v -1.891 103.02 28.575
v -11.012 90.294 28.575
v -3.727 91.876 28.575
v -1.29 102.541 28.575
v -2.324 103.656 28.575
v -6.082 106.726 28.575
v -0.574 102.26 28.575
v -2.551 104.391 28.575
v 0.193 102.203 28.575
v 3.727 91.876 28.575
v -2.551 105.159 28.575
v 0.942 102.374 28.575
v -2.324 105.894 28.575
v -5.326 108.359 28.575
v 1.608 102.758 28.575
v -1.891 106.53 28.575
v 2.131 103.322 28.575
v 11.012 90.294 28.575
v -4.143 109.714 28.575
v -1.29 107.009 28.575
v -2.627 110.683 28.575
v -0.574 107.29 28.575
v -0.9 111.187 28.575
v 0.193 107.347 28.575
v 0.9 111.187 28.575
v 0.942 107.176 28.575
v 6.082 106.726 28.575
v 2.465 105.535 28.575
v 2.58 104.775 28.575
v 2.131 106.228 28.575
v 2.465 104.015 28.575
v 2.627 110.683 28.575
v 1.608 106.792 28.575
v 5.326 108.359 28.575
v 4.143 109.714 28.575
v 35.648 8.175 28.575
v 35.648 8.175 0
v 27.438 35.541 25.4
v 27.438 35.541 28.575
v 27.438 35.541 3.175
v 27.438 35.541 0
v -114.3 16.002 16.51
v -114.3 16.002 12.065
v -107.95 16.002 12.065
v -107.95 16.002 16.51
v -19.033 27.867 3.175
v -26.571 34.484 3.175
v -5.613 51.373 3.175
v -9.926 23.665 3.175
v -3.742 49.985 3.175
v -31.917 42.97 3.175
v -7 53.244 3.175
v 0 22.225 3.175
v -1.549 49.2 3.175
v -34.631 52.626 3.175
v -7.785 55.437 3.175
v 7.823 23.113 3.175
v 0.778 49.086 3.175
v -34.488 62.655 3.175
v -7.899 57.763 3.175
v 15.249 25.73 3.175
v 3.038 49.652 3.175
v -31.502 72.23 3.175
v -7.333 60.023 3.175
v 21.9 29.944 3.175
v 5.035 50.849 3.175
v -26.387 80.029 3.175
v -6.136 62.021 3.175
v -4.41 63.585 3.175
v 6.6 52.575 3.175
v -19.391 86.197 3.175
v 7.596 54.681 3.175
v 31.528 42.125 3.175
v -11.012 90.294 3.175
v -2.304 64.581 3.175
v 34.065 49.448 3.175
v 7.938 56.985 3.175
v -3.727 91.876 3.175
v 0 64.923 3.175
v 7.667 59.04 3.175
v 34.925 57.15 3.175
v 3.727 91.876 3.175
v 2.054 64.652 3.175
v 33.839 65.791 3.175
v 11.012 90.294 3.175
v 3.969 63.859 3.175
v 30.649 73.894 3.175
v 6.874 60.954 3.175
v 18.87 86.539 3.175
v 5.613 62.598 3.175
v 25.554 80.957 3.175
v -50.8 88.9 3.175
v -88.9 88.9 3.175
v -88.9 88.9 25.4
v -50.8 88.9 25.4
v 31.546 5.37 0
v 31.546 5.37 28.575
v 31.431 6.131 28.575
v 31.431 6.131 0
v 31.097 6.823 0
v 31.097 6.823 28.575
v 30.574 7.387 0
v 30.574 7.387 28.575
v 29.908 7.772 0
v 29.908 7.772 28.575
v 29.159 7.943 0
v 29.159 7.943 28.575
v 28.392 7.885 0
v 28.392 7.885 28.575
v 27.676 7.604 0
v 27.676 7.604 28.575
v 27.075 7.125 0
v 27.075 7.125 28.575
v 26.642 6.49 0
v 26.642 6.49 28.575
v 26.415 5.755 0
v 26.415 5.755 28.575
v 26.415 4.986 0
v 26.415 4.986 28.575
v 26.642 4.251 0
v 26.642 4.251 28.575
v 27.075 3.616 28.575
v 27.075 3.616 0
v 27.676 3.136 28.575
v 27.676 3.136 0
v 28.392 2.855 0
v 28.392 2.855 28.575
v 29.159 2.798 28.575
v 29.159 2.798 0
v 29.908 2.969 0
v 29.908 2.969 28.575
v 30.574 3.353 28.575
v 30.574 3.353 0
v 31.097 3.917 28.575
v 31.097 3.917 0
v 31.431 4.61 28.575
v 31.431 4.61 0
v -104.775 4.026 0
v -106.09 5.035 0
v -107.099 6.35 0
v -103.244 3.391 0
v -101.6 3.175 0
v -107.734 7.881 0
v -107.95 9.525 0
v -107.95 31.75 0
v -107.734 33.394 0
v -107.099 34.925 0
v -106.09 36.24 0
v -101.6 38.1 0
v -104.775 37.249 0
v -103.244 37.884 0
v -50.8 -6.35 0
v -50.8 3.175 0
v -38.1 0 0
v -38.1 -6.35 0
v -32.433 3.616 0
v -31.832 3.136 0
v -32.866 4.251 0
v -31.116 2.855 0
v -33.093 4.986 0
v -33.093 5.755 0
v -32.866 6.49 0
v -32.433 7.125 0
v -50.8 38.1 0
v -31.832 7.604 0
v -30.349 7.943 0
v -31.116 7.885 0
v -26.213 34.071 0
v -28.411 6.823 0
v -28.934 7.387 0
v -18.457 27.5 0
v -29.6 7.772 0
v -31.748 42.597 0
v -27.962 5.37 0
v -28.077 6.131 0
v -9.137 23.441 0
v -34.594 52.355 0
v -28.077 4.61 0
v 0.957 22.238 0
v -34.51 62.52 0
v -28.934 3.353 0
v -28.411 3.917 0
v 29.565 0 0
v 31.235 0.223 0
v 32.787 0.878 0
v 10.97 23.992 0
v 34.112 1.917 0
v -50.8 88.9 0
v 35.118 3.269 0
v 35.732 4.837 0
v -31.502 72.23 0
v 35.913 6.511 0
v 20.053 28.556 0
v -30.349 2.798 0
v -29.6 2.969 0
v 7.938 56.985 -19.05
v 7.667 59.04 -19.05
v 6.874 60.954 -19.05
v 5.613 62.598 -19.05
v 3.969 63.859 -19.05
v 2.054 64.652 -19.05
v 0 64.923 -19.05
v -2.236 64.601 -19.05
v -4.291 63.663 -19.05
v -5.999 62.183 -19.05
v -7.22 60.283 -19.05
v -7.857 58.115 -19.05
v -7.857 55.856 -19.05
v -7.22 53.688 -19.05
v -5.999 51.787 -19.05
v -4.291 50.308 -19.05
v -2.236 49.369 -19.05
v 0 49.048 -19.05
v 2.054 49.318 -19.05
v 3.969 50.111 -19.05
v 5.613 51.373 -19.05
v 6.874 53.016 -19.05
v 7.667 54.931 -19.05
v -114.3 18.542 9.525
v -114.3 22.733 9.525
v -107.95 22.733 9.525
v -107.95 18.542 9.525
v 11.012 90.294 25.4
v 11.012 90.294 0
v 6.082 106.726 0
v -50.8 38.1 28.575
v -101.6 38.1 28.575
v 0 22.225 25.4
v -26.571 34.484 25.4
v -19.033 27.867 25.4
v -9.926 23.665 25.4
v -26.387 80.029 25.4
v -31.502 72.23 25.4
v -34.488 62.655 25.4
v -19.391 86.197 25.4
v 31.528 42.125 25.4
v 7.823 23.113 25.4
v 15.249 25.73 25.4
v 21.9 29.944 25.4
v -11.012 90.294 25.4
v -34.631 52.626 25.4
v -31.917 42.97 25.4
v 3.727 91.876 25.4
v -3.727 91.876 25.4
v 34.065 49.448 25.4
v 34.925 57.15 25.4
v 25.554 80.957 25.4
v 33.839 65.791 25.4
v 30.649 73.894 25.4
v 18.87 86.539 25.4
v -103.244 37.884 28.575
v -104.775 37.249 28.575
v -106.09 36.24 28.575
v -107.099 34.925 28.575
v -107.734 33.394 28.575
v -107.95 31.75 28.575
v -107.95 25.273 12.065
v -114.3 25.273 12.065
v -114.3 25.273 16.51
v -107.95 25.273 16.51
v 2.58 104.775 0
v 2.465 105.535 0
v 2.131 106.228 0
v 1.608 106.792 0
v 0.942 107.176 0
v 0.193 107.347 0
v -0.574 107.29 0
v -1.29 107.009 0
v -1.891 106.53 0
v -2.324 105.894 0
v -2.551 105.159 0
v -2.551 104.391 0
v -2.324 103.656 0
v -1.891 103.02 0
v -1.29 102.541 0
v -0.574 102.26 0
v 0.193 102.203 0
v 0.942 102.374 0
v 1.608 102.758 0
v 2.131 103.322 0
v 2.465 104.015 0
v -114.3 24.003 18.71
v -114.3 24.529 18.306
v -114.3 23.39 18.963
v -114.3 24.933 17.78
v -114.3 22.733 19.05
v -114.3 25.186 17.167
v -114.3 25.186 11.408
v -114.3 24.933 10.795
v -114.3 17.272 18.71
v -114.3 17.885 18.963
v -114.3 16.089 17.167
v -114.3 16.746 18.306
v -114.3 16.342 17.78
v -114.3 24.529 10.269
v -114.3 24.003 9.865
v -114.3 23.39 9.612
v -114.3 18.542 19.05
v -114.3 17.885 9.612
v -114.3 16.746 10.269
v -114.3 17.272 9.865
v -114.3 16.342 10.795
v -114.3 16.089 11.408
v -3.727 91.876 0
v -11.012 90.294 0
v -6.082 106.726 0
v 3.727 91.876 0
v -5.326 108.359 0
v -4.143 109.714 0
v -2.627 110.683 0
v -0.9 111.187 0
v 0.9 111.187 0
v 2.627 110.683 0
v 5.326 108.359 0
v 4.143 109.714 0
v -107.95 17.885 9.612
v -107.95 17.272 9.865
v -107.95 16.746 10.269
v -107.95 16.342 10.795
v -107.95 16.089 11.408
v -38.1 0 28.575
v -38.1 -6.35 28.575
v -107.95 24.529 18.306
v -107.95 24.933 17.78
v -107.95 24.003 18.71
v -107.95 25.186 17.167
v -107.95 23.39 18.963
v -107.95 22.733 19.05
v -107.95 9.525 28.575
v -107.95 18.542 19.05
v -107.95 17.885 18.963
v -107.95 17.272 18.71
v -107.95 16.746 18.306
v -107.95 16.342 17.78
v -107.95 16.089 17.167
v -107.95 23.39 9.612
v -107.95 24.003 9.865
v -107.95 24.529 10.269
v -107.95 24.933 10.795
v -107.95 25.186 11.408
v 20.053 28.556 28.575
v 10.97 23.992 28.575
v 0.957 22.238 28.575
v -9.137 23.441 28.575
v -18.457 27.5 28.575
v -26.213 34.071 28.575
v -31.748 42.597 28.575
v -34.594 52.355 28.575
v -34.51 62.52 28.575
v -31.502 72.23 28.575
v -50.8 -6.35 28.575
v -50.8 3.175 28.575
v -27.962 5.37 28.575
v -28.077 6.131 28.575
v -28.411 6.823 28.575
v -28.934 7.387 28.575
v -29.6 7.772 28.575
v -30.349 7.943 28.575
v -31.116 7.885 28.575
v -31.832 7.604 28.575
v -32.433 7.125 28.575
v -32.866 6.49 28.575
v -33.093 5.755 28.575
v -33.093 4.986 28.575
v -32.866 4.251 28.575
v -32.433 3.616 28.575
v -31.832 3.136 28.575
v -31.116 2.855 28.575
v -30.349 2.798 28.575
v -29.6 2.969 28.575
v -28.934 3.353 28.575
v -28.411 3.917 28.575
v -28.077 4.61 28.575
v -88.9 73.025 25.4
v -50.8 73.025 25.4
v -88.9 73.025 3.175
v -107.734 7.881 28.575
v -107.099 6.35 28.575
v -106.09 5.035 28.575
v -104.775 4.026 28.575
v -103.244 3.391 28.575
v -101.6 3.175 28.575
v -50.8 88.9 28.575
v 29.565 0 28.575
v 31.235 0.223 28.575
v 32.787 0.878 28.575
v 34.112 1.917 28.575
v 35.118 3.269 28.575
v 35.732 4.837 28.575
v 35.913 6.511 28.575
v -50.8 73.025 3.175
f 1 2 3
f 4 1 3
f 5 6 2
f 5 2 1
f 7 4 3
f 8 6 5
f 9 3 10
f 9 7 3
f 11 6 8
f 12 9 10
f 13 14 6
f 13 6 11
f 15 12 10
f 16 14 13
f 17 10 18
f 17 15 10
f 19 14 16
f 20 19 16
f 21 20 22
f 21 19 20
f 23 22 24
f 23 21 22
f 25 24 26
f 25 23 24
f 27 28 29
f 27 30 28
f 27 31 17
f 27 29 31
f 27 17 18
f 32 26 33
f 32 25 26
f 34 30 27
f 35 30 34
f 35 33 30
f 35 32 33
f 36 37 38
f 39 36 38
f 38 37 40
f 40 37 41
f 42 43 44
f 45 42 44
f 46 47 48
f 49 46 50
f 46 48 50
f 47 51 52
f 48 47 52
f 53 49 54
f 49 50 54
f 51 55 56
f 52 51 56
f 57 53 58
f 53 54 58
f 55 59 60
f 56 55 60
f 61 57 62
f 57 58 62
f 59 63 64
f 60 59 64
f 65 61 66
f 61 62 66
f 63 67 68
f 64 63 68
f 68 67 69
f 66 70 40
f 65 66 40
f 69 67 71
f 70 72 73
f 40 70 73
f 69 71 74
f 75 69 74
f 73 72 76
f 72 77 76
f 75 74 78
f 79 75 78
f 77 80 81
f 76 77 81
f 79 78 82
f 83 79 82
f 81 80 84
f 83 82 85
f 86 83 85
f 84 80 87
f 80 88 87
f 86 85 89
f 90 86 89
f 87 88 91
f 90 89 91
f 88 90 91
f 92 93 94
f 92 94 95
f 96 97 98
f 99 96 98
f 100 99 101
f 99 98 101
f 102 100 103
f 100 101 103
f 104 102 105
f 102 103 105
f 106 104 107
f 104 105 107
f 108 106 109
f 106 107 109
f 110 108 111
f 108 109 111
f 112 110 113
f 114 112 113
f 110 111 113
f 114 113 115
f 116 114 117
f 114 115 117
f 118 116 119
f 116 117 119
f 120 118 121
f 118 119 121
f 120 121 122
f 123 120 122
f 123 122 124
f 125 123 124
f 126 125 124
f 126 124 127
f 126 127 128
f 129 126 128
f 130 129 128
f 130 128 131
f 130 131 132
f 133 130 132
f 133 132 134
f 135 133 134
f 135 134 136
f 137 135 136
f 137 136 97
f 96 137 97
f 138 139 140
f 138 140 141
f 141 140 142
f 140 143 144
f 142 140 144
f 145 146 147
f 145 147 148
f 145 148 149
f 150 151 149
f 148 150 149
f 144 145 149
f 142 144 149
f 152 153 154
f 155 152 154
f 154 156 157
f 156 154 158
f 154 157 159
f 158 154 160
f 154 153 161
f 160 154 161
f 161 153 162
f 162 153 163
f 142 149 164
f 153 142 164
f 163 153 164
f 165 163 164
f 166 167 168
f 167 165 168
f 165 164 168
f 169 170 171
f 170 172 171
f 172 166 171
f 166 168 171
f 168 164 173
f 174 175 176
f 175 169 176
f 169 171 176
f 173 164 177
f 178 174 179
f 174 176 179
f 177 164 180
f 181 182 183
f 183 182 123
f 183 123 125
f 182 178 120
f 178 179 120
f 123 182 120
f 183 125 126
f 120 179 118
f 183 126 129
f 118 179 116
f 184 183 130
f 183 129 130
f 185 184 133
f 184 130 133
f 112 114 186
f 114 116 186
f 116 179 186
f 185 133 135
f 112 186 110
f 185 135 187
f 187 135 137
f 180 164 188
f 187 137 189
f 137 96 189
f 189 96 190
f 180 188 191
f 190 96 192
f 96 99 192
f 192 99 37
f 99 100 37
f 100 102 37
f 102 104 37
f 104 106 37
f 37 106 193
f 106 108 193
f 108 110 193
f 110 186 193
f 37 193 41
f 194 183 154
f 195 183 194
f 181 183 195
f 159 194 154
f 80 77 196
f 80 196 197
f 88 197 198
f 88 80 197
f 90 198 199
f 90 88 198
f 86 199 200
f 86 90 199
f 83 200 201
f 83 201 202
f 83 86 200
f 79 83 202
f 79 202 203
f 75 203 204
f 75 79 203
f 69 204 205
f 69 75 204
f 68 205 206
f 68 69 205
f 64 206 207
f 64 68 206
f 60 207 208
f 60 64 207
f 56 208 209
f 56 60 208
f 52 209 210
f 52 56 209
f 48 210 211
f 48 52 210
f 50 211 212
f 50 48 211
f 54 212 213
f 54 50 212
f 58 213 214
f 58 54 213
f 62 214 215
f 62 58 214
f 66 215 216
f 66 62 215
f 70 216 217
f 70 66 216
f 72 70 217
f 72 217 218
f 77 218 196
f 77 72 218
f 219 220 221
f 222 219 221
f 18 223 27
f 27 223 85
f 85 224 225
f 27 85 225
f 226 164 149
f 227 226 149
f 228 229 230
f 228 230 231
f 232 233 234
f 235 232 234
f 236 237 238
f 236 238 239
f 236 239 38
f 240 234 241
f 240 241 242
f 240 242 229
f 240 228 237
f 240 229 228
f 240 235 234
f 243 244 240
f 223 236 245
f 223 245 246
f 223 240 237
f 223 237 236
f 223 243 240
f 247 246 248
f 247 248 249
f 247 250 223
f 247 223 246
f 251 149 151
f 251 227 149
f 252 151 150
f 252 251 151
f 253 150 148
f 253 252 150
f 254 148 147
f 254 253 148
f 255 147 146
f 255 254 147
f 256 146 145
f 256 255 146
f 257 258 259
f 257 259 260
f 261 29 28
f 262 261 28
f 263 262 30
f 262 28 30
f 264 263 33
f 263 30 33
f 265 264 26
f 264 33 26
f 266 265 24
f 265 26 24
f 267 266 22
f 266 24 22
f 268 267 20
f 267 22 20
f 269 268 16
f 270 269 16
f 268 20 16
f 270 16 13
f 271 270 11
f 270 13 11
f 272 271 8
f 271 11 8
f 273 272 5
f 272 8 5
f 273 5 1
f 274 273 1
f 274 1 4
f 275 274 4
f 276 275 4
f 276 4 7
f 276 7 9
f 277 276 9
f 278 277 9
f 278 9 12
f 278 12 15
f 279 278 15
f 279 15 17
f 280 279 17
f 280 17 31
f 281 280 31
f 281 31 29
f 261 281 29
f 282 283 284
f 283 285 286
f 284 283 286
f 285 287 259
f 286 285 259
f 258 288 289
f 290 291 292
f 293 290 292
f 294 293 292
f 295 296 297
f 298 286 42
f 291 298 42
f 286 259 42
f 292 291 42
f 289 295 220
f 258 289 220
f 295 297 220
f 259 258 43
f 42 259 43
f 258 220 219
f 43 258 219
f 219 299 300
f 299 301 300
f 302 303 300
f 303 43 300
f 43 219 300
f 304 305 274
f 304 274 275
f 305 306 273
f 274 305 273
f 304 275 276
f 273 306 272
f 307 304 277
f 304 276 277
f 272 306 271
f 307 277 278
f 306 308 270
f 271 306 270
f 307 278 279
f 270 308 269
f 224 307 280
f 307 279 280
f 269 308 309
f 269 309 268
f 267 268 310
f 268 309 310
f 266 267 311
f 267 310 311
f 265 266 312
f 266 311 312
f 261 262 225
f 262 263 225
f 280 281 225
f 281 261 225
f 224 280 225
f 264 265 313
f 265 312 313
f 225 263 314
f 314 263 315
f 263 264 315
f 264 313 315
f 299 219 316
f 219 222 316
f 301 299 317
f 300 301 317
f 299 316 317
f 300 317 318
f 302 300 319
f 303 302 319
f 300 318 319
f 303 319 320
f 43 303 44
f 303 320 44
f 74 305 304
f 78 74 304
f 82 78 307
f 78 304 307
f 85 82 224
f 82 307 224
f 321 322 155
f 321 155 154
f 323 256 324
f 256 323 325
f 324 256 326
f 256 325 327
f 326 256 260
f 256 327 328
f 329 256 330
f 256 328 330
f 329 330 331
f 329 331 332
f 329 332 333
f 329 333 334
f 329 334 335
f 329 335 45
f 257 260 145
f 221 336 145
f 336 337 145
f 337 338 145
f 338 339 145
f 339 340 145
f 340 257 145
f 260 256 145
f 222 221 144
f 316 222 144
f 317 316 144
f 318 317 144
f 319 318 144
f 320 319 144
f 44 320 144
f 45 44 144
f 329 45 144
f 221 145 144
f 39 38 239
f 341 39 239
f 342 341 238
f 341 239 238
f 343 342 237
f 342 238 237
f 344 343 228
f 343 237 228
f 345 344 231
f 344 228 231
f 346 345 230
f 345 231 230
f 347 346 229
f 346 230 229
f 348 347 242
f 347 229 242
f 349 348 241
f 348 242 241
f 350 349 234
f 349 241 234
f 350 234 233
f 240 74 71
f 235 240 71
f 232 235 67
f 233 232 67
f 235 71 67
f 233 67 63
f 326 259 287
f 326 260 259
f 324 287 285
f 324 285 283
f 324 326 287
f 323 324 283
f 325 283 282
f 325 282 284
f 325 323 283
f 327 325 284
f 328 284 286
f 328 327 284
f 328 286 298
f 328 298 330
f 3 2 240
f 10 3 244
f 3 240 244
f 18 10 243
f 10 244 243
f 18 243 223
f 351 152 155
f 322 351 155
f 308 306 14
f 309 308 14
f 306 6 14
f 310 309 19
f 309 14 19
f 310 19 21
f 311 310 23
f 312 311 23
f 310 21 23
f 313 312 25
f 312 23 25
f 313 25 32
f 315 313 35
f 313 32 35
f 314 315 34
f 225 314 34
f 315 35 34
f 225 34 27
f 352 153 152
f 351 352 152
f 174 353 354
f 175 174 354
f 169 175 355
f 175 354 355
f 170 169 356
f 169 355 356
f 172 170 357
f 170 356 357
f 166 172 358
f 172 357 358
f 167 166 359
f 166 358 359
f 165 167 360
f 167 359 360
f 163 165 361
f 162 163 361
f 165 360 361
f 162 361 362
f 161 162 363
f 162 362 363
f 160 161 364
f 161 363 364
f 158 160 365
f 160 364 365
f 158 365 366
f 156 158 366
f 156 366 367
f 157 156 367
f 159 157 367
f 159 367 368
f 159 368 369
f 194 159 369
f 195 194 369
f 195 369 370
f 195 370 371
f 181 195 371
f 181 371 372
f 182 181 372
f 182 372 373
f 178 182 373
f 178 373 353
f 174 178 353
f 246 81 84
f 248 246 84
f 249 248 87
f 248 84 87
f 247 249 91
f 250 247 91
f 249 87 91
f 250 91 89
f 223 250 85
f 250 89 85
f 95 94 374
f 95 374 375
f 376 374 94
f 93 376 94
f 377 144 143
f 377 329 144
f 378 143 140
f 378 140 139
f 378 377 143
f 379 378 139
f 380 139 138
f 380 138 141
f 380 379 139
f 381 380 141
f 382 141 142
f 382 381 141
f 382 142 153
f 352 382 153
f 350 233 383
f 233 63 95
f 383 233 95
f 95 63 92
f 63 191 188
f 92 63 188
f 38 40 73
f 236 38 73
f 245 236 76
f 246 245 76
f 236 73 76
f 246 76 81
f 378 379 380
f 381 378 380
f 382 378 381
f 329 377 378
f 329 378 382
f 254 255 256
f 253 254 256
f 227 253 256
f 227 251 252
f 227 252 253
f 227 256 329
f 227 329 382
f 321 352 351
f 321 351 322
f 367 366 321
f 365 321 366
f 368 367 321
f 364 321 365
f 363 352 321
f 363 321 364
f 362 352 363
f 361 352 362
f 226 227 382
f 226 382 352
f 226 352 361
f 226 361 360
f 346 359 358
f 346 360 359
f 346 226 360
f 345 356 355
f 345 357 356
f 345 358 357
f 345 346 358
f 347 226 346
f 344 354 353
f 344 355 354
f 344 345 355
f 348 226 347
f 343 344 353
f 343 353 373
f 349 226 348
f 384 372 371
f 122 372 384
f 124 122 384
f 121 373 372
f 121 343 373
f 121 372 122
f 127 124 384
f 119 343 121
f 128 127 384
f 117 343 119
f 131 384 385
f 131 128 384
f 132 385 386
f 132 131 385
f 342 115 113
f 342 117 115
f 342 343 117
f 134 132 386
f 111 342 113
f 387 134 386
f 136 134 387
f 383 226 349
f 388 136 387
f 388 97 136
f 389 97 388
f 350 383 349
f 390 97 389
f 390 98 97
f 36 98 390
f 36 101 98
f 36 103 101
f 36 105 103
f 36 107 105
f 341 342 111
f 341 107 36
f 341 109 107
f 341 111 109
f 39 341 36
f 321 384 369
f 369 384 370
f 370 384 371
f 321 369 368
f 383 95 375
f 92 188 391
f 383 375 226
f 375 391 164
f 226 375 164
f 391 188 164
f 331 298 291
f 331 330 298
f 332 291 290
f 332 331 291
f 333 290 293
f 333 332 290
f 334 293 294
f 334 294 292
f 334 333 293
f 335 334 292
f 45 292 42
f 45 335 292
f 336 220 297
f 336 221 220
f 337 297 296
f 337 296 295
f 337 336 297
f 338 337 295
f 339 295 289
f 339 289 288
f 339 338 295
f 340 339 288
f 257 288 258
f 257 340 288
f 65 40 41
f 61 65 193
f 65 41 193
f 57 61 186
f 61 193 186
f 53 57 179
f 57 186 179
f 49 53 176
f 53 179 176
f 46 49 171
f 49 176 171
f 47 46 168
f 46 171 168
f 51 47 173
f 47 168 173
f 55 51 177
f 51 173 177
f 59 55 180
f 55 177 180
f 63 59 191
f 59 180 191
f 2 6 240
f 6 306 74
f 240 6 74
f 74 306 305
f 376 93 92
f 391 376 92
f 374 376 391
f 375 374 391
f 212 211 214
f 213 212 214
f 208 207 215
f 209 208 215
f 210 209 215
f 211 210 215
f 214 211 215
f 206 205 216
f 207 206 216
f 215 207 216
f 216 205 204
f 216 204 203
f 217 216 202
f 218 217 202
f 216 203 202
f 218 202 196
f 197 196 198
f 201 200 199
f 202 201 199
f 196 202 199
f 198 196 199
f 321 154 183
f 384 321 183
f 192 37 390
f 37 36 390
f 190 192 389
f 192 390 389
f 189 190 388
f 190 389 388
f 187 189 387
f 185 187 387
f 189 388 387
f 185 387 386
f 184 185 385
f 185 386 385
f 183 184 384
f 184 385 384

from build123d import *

# Parameters (mm, degrees)
F1_DEPTH  = 28.575
F2_START  = 3.175
F2_DEPTH  = 22.225
F3_START  = 3.175
F0_W      = 38.1
F0_H      = 15.875
F3_DEPTH  = 22.225
F5_DEPTH  = 19.05
F6_R      = 6.35
F7_START  = 9.525
F0_W_2    = 6.35
F0_H_2    = 4.6355
F7_DEPTH  = 9.525
F8_R      = 2.54
F9_R      = 2.5796875
F10_DEPTH = 47.626


with BuildPart() as f1:
    # F0 (on Top) → F1 (new body)
    with BuildSketch(Plane.XY):
        with BuildLine():
            Line((0, 127), (0, 92.075))
            ThreePointArc((0, 92.075), (5.5775580758, 91.6267526155), (11.0119450237, 90.2935165876))
            Line((11.0119450237, 90.2935165876), (0, 127))
        make_face()
        with BuildLine():
            ThreePointArc((-11.0119450237, 90.2935165876), (-5.5775580758, 91.6267526155), (0, 92.075))
            Line((0, 92.075), (0, 127))
            Line((0, 127), (-11.0119450237, 90.2935165876))
        make_face()
    extrude(amount=F1_DEPTH)



with BuildPart() as f1b:
    # F0 (on Top) → F1, piece 2 (new body)
    with BuildSketch(Plane.XY):
        with BuildLine():
            Line((0, 22.225), (0, 0))
            Line((0, 0), (38.1, 0))
            Line((38.1, 0), (27.4375962607, 35.5413457977))
            ThreePointArc((27.4375962607, 35.5413457977), (15.2491536976, 25.7299596355), (0, 22.225))
        make_face()
        with BuildLine():
            Line((-38.1, 0), (0, 0))
            Line((0, 0), (0, 22.225))
            ThreePointArc((0, 22.225), (-15.2491536976, 25.7299596355), (-27.4375962607, 35.5413457977))
            Line((-27.4375962607, 35.5413457977), (-38.1, 0))
        make_face()
        with BuildLine():
            Line((-38.1, -6.35), (-38.1, 0))
            Line((-38.1, 0), (-27.4375962607, 35.5413457977))
            ThreePointArc((-27.4375962607, 35.5413457977), (-34.7126867768, 53.3048729883), (-31.5015963811, 72.2299552534))
            Line((-31.5015963811, 72.2299552534), (-50.8, 88.9))
            Line((-50.8, 88.9), (-50.8, 73.025))
            Line((-50.8, 73.025), (-50.8, 38.1))
            Line((-50.8, 38.1), (-50.8, 3.175))
            Line((-50.8, 3.175), (-50.8, -6.35))
            Line((-50.8, -6.35), (-38.1, -6.35))
        make_face()
        Polygon((-107.95, 3.175), (-50.8, 3.175), (-50.8, 38.1), (-107.95, 38.1), (-107.95, 25.273), (-107.95, 20.6375), (-107.95, 16.002), align=None)
    extrude(amount=F1_DEPTH)


with BuildPart() as f1_1:
    add(f1.part)

    add(f1b.part)  # F2 merges F1b
    # F0 (on Top) → F2 (join)
    with BuildSketch(Plane.XY.offset(F2_START)):
        with BuildLine():
            ThreePointArc((-31.5015963811, 72.2299552534), (-34.7126867768, 53.3048729883), (-27.4375962607, 35.5413457977))
            Line((-27.4375962607, 35.5413457977), (-11.0119450237, 90.2935165876))
            ThreePointArc((-11.0119450237, 90.2935165876), (-23.0959598786, 83.3479438561), (-31.5015963811, 72.2299552534))
        make_face()
        with BuildLine():
            ThreePointArc((-27.4375962607, 35.5413457977), (-15.2491536976, 25.7299596355), (0, 22.225))
            Line((0, 22.225), (0, 92.075))
            ThreePointArc((0, 92.075), (-5.5775580758, 91.6267526155), (-11.0119450237, 90.2935165876))
            Line((-11.0119450237, 90.2935165876), (-27.4375962607, 35.5413457977))
        make_face()
        with BuildLine():
            Line((0, 92.075), (0, 22.225))
            ThreePointArc((0, 22.225), (15.2491536976, 25.7299596355), (27.4375962607, 35.5413457977))
            Line((27.4375962607, 35.5413457977), (11.0119450237, 90.2935165876))
            ThreePointArc((11.0119450237, 90.2935165876), (5.5775580758, 91.6267526155), (0, 92.075))
        make_face()
        with BuildLine():
            Line((11.0119450237, 90.2935165876), (27.4375962607, 35.5413457977))
            ThreePointArc((27.4375962607, 35.5413457977), (33.0001035938, 45.71545638), (34.925, 57.15))
            ThreePointArc((34.925, 57.15), (28.3226747056, 77.5848164299), (11.0119450237, 90.2935165876))
        make_face()
    extrude(amount=F2_DEPTH)

    # F0 (on Top) → F3 (join)
    with BuildSketch(Plane.XY.offset(F3_START)):
        with Locations((-69.85, 80.9625)):
            Rectangle(F0_W, F0_H)
    extrude(amount=F3_DEPTH)

    # F4 (on face) → F5 (join, symmetric)
    with BuildSketch(Plane.XY):
        with BuildLine():
            ThreePointArc((0, 49.0477367043), (5.6126600757, 51.3725766287), (7.9375, 56.9852367043))
            ThreePointArc((7.9375, 56.9852367043), (5.6126600757, 62.59789678), (0, 64.9227367043))
            Line((0, 64.9227367043), (0, 49.0477367043))
        make_face()
        with BuildLine():
            Line((0, 49.0477367043), (0, 64.9227367043))
            ThreePointArc((0, 64.9227367043), (-7.9375, 56.9852367043), (0, 49.0477367043))
        make_face()
    extrude(amount=F5_DEPTH, both=True)

    # F6
    f6_edges = [f1_1.edges().sort_by_distance(p)[0] for p in [
        (0, 127, 14.2875),
        (38.1, 0, 14.2875),
        (-107.95, 3.175, 14.2875),
        (-107.95, 38.1, 14.2875),
    ]]
    fillet(f6_edges, radius=F6_R)

    # F0 (on Top) → F7 (join)
    with BuildSketch(Plane.XY.offset(F7_START)):
        with Locations((-111.125, 22.95525)):
            Rectangle(F0_W_2, F0_H_2)
        with Locations((-111.125, 18.31975)):
            Rectangle(F0_W_2, F0_H_2)
    extrude(amount=F7_DEPTH)

    # F8
    f8_edges = [f1_1.edges().sort_by_distance(p)[0] for p in [
        (-111.125, 25.273, 19.05),
        (-111.125, 16.002, 19.05),
        (-111.125, 16.002, 9.525),
        (-111.125, 25.273, 9.525),
    ]]
    fillet(f8_edges, radius=F8_R)

    # F9 (on face) → F10 (cut, through all)
    with BuildSketch(Plane.XY.offset(28.575)):
        with Locations((0, 104.775)):
            Circle(F9_R)
        with Locations((28.965945942, 5.3702991543)):
            Circle(F9_R)
        with Locations((-30.5421855315, 5.3702991543)):
            Circle(F9_R)
    extrude(amount=-F10_DEPTH, mode=Mode.SUBTRACT)


solid = f1_1.part
